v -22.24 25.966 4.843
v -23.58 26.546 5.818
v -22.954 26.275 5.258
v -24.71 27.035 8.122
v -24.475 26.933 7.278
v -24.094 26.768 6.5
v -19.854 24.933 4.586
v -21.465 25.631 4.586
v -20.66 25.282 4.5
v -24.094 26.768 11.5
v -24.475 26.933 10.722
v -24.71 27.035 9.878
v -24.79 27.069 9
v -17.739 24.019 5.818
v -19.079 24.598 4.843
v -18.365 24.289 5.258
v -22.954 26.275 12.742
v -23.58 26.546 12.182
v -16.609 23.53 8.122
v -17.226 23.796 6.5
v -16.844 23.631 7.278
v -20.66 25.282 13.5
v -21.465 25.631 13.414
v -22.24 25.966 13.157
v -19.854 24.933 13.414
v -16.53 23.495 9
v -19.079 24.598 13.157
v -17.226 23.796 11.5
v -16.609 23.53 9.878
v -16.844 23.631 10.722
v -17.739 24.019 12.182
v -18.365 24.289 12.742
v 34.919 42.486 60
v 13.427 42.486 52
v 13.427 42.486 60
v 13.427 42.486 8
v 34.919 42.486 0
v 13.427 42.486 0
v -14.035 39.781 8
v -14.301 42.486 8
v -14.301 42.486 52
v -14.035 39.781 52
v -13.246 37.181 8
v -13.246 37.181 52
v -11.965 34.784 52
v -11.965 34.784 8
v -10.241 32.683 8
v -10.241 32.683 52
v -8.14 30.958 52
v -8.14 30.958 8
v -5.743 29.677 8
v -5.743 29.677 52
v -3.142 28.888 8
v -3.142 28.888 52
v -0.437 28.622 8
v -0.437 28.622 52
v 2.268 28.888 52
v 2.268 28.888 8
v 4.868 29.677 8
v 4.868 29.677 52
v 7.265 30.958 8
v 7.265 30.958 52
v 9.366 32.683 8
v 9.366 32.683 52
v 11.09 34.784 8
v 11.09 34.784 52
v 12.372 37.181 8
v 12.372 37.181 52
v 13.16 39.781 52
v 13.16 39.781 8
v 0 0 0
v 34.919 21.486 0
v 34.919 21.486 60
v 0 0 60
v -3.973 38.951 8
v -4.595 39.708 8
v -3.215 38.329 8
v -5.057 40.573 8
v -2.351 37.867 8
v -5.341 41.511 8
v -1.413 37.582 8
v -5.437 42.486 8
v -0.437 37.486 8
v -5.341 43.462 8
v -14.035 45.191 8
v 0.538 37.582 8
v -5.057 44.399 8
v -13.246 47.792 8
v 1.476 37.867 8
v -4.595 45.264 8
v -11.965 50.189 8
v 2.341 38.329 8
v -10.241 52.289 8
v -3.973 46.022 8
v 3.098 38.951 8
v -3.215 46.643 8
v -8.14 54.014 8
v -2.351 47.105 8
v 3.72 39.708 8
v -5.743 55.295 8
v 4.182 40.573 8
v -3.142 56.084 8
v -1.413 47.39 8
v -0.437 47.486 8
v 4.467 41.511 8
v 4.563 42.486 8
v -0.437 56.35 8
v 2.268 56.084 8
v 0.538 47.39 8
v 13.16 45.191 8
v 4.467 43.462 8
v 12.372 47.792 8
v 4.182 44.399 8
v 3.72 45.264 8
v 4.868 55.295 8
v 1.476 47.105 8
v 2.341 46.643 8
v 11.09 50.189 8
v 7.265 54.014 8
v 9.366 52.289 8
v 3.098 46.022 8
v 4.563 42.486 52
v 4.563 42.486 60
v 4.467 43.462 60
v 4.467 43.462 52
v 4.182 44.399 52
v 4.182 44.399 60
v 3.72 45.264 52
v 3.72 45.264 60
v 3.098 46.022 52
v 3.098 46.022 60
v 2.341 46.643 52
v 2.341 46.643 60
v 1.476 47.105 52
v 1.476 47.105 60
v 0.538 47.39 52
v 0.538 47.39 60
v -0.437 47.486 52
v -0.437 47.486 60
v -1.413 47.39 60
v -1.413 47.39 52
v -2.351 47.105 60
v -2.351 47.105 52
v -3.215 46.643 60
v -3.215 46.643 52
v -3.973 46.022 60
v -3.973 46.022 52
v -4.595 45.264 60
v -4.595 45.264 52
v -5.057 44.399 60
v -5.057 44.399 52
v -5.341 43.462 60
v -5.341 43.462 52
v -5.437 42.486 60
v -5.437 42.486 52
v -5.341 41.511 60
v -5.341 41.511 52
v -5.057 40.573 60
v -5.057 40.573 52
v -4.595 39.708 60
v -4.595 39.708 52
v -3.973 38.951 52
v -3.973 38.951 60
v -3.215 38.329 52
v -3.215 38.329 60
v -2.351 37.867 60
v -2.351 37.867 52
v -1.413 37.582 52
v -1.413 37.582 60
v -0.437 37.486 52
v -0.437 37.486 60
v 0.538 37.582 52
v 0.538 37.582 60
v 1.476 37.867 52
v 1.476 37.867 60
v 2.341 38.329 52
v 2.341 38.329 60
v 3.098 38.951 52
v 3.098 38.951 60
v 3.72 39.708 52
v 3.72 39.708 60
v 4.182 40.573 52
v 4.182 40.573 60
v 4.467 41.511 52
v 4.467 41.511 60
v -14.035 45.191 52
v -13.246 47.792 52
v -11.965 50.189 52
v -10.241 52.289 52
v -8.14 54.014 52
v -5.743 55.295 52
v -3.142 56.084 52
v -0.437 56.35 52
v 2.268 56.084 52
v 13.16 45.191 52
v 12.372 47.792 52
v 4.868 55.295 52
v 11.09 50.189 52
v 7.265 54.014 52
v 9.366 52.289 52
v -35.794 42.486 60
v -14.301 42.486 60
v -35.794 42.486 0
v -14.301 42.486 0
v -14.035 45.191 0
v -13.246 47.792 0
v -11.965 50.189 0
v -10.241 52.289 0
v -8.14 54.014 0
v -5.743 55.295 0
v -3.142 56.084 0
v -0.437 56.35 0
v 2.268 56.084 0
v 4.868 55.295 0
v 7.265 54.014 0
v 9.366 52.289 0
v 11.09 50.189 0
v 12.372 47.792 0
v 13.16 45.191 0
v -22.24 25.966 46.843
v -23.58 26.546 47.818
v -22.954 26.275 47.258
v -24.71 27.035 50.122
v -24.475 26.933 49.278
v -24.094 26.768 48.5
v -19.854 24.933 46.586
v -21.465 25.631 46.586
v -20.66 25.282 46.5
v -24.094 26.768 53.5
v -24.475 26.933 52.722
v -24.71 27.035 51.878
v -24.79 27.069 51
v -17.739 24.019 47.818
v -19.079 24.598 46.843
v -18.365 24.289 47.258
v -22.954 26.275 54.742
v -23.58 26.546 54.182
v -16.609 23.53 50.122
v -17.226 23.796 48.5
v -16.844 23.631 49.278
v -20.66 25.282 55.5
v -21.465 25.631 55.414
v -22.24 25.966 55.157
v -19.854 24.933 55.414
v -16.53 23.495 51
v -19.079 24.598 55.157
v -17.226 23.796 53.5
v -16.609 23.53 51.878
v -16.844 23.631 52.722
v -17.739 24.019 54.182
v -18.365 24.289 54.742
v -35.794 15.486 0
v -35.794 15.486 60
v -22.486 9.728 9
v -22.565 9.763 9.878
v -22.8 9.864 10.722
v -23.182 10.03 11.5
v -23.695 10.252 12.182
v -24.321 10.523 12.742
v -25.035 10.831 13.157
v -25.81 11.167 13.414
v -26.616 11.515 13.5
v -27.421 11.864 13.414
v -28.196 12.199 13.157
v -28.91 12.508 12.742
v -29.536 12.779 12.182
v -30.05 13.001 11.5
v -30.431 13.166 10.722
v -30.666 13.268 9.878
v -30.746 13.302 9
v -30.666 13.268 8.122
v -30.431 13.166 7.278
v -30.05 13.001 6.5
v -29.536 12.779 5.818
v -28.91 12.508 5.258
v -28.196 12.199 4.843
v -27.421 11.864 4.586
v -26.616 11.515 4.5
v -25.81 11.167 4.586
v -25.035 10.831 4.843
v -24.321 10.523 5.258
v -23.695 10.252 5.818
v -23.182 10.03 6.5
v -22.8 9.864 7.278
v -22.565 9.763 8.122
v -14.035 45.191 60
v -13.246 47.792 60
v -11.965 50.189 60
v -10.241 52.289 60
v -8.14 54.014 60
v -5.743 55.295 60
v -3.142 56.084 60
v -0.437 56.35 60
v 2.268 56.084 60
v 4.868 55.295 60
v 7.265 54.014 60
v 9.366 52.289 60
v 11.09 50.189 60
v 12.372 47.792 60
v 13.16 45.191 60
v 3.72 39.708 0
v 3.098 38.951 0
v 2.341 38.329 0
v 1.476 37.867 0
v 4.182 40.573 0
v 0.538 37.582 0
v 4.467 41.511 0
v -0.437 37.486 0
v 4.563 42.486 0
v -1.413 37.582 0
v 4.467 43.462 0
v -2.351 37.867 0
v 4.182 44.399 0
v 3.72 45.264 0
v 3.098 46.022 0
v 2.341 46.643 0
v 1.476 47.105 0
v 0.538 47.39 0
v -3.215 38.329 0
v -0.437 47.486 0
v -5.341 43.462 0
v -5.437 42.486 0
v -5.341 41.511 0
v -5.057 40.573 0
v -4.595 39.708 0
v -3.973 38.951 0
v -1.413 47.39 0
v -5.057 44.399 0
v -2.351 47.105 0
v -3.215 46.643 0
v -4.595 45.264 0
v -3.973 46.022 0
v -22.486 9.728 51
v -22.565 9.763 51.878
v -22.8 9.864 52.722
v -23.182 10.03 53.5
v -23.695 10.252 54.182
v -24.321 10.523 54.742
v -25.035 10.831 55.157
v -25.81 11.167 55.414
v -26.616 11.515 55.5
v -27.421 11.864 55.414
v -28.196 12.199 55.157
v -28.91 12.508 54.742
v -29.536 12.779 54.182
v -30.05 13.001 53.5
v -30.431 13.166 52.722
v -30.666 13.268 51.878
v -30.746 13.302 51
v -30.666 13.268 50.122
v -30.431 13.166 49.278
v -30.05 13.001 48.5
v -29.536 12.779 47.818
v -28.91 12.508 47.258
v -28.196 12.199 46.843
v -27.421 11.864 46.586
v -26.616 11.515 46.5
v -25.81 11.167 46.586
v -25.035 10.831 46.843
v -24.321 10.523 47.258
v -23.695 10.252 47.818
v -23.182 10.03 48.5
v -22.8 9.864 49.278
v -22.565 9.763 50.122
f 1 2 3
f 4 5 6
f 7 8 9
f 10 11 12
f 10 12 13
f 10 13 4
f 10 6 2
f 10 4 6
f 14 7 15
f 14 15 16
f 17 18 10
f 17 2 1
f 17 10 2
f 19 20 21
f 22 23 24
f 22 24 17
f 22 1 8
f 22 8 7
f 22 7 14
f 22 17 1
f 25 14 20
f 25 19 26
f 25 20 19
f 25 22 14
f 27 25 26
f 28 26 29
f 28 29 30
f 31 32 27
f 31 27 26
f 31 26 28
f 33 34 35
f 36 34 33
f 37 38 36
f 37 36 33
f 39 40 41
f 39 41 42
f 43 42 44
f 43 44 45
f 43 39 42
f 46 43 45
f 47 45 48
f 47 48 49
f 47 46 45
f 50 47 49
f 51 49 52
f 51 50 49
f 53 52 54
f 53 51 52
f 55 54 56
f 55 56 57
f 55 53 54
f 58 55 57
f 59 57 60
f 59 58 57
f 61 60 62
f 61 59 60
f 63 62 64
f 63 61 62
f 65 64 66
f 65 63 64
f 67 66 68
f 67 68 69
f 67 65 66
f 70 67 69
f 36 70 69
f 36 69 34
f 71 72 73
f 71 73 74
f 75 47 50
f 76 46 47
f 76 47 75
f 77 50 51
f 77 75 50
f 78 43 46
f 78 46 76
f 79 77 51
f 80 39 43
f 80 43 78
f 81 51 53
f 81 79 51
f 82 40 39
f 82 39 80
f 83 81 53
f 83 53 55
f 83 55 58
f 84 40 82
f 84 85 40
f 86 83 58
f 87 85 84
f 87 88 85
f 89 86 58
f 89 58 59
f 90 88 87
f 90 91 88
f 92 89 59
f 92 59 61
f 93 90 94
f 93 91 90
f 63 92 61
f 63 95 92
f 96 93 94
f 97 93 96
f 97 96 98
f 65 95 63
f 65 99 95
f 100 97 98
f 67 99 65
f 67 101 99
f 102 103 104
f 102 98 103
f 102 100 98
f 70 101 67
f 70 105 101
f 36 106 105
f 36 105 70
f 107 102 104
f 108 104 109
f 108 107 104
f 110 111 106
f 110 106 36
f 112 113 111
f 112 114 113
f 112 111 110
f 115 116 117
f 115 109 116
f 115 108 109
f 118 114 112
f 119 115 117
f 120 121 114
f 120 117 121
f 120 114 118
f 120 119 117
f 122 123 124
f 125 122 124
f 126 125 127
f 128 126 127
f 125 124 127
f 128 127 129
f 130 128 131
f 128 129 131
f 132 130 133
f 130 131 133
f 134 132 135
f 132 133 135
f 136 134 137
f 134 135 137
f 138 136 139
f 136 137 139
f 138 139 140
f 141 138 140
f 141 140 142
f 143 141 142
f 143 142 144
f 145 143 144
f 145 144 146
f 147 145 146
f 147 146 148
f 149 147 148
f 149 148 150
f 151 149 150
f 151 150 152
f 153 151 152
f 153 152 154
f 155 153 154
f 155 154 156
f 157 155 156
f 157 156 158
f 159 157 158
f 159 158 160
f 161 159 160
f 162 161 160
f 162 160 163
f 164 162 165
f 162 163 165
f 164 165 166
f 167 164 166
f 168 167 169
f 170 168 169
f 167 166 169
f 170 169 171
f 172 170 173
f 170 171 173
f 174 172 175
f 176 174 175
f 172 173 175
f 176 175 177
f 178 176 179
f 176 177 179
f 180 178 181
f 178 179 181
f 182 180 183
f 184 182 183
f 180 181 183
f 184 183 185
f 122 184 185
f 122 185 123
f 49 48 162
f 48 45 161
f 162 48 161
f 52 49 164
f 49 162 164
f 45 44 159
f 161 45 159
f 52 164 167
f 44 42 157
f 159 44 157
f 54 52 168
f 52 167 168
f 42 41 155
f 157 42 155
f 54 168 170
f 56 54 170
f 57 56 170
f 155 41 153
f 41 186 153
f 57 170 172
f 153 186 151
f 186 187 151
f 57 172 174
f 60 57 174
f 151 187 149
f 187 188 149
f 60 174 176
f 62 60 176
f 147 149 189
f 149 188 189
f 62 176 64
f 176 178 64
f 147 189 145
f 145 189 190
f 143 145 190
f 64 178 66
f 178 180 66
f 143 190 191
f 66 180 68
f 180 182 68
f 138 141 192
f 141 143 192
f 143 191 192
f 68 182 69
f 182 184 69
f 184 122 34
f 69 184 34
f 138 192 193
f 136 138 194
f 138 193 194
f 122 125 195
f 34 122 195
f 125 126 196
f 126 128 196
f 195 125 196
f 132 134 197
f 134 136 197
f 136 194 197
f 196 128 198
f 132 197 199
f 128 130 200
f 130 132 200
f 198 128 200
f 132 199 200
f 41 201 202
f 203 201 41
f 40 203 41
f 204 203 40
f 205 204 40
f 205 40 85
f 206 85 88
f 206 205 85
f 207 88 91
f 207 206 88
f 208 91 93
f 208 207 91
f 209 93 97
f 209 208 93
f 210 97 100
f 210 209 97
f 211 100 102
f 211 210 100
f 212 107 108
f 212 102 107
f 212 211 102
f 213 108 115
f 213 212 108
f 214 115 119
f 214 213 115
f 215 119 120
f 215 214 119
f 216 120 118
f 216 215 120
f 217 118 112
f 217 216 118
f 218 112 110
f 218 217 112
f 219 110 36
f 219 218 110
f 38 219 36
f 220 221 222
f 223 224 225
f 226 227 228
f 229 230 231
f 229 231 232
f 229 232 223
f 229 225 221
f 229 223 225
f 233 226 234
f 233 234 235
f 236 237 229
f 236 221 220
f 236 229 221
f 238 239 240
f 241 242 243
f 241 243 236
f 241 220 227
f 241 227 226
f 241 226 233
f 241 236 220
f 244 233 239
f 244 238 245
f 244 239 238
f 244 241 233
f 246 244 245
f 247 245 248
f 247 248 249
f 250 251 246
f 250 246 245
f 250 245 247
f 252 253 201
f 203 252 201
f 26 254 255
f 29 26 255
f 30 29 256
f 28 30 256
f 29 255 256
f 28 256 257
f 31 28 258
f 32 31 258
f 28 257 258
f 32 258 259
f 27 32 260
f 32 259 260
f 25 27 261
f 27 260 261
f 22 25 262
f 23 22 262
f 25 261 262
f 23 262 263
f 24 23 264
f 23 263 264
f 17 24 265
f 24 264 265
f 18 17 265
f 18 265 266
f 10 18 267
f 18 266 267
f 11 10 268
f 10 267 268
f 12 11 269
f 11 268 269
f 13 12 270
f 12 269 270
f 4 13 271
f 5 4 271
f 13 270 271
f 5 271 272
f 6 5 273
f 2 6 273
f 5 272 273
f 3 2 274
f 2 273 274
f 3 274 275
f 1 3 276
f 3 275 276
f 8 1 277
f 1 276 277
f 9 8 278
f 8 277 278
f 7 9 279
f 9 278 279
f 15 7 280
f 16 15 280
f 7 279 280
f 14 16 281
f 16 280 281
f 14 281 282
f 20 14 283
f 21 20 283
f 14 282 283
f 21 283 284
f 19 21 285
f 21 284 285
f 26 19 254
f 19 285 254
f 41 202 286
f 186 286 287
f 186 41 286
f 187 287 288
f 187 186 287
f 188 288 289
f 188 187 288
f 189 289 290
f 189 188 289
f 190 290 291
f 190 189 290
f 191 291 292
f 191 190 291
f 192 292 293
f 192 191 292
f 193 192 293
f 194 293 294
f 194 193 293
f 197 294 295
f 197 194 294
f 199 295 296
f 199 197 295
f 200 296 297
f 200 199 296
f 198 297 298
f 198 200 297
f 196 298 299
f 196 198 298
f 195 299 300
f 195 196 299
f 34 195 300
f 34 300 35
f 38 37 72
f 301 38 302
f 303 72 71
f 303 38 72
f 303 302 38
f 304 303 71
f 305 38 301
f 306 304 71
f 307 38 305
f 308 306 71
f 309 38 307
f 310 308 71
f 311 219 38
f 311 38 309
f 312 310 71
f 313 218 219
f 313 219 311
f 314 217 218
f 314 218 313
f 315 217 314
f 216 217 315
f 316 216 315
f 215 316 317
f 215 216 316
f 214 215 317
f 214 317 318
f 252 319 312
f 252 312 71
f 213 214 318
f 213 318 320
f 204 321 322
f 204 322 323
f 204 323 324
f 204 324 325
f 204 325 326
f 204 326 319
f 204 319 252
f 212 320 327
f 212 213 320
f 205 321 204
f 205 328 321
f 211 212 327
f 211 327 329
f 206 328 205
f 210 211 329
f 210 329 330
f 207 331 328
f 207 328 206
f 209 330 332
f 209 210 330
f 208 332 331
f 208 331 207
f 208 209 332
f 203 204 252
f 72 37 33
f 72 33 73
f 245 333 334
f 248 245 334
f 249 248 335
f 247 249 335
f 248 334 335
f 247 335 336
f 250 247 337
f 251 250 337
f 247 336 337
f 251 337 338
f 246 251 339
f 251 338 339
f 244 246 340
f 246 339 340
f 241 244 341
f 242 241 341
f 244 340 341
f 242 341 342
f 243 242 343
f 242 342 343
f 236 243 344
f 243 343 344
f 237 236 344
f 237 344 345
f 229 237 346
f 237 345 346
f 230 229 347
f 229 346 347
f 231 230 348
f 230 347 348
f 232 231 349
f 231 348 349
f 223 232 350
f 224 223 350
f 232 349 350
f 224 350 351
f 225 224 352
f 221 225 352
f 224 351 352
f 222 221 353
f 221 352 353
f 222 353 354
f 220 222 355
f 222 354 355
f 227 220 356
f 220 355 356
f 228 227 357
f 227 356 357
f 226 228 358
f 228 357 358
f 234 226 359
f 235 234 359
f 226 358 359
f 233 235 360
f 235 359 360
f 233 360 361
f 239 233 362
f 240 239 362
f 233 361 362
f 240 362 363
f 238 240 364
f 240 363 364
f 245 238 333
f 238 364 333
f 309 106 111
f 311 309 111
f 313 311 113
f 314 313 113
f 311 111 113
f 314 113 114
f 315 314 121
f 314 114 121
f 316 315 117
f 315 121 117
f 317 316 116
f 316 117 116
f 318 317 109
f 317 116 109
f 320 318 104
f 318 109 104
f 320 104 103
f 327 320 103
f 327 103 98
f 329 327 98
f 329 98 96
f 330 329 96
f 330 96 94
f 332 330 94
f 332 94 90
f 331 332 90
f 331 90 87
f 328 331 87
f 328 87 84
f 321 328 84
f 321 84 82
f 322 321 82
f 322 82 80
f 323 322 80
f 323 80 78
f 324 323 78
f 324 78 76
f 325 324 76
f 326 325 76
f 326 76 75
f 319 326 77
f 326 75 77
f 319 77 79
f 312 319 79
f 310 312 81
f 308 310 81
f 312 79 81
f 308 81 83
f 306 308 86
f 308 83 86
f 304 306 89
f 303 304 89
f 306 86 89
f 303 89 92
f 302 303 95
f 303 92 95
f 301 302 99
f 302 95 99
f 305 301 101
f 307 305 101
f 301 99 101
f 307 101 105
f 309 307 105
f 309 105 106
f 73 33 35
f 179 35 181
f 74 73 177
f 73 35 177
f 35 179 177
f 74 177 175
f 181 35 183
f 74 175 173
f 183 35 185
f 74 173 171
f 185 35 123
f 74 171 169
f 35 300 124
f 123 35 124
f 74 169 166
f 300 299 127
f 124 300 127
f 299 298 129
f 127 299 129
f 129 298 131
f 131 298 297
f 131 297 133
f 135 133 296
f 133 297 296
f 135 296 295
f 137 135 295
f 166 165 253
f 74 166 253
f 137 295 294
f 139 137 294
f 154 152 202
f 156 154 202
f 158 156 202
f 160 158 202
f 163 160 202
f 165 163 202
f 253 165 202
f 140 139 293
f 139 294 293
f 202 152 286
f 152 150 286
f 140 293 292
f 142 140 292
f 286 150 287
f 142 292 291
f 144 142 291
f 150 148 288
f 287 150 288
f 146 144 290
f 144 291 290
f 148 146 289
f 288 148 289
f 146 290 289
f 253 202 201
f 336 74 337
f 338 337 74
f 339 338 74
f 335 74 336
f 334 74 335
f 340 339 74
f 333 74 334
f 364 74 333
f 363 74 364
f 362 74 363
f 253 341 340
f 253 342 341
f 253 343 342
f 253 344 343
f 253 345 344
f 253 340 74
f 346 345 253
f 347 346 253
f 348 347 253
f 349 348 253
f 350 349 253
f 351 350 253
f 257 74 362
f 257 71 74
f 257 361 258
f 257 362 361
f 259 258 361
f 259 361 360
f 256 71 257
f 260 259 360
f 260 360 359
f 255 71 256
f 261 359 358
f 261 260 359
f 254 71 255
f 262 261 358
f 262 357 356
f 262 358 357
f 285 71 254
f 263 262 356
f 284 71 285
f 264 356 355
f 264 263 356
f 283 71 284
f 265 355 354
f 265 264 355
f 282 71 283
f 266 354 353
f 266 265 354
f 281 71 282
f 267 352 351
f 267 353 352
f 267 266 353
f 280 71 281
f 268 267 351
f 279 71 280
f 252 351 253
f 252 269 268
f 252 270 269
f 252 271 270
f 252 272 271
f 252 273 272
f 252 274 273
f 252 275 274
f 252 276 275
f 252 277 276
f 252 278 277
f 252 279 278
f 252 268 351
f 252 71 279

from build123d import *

# Parameters (mm, degrees)
BOSS_EXTRUDE1_DEPTH = 60
CUT_EXTRUDE1_START  = -52
SKETCH3_R           = 13.864092281
CUT_EXTRUDE1_DEPTH  = 44
SKETCH4_R           = 5
CUT_EXTRUDE2_DEPTH  = 90.75812925
SKETCH5_R           = 4.5
CUT_EXTRUDE3_DEPTH  = 15


with BuildPart() as part:
    # Sketch1 → Boss-Extrude1 (new body)
    with BuildSketch(Plane.XY):
        with BuildLine():
            Line((0, 0), (-35.793601182, 15.486061941))
            Line((-35.793601182, 15.486061941), (-35.793601182, 42.486061941))
            Line((-35.793601182, 42.486061941), (-14.301302797, 42.486061941))
            ThreePointArc((-14.301302797, 42.486061941), (-0.437210516, 56.350154222), (13.426881764, 42.486061941))
            Line((13.426881764, 42.486061941), (34.919180149, 42.486061941))
            Line((34.919180149, 42.486061941), (34.919180149, 21.486061941))
            Line((34.919180149, 21.486061941), (0, 0))
        make_face()
    extrude(amount=BOSS_EXTRUDE1_DEPTH)

    # Sketch3 → Cut-Extrude1 (cut)
    with BuildSketch(Plane.XY.offset(60).offset(CUT_EXTRUDE1_START)):
        with Locations((-0.437210516, 42.486061941)):
            Circle(SKETCH3_R)
    extrude(amount=CUT_EXTRUDE1_DEPTH, mode=Mode.SUBTRACT)

    # Sketch4 → Cut-Extrude2 (cut, through all)
    with BuildSketch(Plane.XY.offset(60)):
        with Locations((-0.437210516, 42.486061941)):
            Circle(SKETCH4_R)
    extrude(amount=-CUT_EXTRUDE2_DEPTH, mode=Mode.SUBTRACT)

    # Sketch5 → Cut-Extrude3 (cut)
    with BuildSketch(Plane(origin=(0, 0, 0), x_dir=(0.9177846456818411, -0.3970785113181741, 0), z_dir=(-0.3970785113181742, -0.9177846456818413, 0))):
        with Locations((-29, 51)):
            Circle(SKETCH5_R)
        with Locations((-29, 9)):
            Circle(SKETCH5_R)
    extrude(amount=-CUT_EXTRUDE3_DEPTH, mode=Mode.SUBTRACT)


solid = part.part
